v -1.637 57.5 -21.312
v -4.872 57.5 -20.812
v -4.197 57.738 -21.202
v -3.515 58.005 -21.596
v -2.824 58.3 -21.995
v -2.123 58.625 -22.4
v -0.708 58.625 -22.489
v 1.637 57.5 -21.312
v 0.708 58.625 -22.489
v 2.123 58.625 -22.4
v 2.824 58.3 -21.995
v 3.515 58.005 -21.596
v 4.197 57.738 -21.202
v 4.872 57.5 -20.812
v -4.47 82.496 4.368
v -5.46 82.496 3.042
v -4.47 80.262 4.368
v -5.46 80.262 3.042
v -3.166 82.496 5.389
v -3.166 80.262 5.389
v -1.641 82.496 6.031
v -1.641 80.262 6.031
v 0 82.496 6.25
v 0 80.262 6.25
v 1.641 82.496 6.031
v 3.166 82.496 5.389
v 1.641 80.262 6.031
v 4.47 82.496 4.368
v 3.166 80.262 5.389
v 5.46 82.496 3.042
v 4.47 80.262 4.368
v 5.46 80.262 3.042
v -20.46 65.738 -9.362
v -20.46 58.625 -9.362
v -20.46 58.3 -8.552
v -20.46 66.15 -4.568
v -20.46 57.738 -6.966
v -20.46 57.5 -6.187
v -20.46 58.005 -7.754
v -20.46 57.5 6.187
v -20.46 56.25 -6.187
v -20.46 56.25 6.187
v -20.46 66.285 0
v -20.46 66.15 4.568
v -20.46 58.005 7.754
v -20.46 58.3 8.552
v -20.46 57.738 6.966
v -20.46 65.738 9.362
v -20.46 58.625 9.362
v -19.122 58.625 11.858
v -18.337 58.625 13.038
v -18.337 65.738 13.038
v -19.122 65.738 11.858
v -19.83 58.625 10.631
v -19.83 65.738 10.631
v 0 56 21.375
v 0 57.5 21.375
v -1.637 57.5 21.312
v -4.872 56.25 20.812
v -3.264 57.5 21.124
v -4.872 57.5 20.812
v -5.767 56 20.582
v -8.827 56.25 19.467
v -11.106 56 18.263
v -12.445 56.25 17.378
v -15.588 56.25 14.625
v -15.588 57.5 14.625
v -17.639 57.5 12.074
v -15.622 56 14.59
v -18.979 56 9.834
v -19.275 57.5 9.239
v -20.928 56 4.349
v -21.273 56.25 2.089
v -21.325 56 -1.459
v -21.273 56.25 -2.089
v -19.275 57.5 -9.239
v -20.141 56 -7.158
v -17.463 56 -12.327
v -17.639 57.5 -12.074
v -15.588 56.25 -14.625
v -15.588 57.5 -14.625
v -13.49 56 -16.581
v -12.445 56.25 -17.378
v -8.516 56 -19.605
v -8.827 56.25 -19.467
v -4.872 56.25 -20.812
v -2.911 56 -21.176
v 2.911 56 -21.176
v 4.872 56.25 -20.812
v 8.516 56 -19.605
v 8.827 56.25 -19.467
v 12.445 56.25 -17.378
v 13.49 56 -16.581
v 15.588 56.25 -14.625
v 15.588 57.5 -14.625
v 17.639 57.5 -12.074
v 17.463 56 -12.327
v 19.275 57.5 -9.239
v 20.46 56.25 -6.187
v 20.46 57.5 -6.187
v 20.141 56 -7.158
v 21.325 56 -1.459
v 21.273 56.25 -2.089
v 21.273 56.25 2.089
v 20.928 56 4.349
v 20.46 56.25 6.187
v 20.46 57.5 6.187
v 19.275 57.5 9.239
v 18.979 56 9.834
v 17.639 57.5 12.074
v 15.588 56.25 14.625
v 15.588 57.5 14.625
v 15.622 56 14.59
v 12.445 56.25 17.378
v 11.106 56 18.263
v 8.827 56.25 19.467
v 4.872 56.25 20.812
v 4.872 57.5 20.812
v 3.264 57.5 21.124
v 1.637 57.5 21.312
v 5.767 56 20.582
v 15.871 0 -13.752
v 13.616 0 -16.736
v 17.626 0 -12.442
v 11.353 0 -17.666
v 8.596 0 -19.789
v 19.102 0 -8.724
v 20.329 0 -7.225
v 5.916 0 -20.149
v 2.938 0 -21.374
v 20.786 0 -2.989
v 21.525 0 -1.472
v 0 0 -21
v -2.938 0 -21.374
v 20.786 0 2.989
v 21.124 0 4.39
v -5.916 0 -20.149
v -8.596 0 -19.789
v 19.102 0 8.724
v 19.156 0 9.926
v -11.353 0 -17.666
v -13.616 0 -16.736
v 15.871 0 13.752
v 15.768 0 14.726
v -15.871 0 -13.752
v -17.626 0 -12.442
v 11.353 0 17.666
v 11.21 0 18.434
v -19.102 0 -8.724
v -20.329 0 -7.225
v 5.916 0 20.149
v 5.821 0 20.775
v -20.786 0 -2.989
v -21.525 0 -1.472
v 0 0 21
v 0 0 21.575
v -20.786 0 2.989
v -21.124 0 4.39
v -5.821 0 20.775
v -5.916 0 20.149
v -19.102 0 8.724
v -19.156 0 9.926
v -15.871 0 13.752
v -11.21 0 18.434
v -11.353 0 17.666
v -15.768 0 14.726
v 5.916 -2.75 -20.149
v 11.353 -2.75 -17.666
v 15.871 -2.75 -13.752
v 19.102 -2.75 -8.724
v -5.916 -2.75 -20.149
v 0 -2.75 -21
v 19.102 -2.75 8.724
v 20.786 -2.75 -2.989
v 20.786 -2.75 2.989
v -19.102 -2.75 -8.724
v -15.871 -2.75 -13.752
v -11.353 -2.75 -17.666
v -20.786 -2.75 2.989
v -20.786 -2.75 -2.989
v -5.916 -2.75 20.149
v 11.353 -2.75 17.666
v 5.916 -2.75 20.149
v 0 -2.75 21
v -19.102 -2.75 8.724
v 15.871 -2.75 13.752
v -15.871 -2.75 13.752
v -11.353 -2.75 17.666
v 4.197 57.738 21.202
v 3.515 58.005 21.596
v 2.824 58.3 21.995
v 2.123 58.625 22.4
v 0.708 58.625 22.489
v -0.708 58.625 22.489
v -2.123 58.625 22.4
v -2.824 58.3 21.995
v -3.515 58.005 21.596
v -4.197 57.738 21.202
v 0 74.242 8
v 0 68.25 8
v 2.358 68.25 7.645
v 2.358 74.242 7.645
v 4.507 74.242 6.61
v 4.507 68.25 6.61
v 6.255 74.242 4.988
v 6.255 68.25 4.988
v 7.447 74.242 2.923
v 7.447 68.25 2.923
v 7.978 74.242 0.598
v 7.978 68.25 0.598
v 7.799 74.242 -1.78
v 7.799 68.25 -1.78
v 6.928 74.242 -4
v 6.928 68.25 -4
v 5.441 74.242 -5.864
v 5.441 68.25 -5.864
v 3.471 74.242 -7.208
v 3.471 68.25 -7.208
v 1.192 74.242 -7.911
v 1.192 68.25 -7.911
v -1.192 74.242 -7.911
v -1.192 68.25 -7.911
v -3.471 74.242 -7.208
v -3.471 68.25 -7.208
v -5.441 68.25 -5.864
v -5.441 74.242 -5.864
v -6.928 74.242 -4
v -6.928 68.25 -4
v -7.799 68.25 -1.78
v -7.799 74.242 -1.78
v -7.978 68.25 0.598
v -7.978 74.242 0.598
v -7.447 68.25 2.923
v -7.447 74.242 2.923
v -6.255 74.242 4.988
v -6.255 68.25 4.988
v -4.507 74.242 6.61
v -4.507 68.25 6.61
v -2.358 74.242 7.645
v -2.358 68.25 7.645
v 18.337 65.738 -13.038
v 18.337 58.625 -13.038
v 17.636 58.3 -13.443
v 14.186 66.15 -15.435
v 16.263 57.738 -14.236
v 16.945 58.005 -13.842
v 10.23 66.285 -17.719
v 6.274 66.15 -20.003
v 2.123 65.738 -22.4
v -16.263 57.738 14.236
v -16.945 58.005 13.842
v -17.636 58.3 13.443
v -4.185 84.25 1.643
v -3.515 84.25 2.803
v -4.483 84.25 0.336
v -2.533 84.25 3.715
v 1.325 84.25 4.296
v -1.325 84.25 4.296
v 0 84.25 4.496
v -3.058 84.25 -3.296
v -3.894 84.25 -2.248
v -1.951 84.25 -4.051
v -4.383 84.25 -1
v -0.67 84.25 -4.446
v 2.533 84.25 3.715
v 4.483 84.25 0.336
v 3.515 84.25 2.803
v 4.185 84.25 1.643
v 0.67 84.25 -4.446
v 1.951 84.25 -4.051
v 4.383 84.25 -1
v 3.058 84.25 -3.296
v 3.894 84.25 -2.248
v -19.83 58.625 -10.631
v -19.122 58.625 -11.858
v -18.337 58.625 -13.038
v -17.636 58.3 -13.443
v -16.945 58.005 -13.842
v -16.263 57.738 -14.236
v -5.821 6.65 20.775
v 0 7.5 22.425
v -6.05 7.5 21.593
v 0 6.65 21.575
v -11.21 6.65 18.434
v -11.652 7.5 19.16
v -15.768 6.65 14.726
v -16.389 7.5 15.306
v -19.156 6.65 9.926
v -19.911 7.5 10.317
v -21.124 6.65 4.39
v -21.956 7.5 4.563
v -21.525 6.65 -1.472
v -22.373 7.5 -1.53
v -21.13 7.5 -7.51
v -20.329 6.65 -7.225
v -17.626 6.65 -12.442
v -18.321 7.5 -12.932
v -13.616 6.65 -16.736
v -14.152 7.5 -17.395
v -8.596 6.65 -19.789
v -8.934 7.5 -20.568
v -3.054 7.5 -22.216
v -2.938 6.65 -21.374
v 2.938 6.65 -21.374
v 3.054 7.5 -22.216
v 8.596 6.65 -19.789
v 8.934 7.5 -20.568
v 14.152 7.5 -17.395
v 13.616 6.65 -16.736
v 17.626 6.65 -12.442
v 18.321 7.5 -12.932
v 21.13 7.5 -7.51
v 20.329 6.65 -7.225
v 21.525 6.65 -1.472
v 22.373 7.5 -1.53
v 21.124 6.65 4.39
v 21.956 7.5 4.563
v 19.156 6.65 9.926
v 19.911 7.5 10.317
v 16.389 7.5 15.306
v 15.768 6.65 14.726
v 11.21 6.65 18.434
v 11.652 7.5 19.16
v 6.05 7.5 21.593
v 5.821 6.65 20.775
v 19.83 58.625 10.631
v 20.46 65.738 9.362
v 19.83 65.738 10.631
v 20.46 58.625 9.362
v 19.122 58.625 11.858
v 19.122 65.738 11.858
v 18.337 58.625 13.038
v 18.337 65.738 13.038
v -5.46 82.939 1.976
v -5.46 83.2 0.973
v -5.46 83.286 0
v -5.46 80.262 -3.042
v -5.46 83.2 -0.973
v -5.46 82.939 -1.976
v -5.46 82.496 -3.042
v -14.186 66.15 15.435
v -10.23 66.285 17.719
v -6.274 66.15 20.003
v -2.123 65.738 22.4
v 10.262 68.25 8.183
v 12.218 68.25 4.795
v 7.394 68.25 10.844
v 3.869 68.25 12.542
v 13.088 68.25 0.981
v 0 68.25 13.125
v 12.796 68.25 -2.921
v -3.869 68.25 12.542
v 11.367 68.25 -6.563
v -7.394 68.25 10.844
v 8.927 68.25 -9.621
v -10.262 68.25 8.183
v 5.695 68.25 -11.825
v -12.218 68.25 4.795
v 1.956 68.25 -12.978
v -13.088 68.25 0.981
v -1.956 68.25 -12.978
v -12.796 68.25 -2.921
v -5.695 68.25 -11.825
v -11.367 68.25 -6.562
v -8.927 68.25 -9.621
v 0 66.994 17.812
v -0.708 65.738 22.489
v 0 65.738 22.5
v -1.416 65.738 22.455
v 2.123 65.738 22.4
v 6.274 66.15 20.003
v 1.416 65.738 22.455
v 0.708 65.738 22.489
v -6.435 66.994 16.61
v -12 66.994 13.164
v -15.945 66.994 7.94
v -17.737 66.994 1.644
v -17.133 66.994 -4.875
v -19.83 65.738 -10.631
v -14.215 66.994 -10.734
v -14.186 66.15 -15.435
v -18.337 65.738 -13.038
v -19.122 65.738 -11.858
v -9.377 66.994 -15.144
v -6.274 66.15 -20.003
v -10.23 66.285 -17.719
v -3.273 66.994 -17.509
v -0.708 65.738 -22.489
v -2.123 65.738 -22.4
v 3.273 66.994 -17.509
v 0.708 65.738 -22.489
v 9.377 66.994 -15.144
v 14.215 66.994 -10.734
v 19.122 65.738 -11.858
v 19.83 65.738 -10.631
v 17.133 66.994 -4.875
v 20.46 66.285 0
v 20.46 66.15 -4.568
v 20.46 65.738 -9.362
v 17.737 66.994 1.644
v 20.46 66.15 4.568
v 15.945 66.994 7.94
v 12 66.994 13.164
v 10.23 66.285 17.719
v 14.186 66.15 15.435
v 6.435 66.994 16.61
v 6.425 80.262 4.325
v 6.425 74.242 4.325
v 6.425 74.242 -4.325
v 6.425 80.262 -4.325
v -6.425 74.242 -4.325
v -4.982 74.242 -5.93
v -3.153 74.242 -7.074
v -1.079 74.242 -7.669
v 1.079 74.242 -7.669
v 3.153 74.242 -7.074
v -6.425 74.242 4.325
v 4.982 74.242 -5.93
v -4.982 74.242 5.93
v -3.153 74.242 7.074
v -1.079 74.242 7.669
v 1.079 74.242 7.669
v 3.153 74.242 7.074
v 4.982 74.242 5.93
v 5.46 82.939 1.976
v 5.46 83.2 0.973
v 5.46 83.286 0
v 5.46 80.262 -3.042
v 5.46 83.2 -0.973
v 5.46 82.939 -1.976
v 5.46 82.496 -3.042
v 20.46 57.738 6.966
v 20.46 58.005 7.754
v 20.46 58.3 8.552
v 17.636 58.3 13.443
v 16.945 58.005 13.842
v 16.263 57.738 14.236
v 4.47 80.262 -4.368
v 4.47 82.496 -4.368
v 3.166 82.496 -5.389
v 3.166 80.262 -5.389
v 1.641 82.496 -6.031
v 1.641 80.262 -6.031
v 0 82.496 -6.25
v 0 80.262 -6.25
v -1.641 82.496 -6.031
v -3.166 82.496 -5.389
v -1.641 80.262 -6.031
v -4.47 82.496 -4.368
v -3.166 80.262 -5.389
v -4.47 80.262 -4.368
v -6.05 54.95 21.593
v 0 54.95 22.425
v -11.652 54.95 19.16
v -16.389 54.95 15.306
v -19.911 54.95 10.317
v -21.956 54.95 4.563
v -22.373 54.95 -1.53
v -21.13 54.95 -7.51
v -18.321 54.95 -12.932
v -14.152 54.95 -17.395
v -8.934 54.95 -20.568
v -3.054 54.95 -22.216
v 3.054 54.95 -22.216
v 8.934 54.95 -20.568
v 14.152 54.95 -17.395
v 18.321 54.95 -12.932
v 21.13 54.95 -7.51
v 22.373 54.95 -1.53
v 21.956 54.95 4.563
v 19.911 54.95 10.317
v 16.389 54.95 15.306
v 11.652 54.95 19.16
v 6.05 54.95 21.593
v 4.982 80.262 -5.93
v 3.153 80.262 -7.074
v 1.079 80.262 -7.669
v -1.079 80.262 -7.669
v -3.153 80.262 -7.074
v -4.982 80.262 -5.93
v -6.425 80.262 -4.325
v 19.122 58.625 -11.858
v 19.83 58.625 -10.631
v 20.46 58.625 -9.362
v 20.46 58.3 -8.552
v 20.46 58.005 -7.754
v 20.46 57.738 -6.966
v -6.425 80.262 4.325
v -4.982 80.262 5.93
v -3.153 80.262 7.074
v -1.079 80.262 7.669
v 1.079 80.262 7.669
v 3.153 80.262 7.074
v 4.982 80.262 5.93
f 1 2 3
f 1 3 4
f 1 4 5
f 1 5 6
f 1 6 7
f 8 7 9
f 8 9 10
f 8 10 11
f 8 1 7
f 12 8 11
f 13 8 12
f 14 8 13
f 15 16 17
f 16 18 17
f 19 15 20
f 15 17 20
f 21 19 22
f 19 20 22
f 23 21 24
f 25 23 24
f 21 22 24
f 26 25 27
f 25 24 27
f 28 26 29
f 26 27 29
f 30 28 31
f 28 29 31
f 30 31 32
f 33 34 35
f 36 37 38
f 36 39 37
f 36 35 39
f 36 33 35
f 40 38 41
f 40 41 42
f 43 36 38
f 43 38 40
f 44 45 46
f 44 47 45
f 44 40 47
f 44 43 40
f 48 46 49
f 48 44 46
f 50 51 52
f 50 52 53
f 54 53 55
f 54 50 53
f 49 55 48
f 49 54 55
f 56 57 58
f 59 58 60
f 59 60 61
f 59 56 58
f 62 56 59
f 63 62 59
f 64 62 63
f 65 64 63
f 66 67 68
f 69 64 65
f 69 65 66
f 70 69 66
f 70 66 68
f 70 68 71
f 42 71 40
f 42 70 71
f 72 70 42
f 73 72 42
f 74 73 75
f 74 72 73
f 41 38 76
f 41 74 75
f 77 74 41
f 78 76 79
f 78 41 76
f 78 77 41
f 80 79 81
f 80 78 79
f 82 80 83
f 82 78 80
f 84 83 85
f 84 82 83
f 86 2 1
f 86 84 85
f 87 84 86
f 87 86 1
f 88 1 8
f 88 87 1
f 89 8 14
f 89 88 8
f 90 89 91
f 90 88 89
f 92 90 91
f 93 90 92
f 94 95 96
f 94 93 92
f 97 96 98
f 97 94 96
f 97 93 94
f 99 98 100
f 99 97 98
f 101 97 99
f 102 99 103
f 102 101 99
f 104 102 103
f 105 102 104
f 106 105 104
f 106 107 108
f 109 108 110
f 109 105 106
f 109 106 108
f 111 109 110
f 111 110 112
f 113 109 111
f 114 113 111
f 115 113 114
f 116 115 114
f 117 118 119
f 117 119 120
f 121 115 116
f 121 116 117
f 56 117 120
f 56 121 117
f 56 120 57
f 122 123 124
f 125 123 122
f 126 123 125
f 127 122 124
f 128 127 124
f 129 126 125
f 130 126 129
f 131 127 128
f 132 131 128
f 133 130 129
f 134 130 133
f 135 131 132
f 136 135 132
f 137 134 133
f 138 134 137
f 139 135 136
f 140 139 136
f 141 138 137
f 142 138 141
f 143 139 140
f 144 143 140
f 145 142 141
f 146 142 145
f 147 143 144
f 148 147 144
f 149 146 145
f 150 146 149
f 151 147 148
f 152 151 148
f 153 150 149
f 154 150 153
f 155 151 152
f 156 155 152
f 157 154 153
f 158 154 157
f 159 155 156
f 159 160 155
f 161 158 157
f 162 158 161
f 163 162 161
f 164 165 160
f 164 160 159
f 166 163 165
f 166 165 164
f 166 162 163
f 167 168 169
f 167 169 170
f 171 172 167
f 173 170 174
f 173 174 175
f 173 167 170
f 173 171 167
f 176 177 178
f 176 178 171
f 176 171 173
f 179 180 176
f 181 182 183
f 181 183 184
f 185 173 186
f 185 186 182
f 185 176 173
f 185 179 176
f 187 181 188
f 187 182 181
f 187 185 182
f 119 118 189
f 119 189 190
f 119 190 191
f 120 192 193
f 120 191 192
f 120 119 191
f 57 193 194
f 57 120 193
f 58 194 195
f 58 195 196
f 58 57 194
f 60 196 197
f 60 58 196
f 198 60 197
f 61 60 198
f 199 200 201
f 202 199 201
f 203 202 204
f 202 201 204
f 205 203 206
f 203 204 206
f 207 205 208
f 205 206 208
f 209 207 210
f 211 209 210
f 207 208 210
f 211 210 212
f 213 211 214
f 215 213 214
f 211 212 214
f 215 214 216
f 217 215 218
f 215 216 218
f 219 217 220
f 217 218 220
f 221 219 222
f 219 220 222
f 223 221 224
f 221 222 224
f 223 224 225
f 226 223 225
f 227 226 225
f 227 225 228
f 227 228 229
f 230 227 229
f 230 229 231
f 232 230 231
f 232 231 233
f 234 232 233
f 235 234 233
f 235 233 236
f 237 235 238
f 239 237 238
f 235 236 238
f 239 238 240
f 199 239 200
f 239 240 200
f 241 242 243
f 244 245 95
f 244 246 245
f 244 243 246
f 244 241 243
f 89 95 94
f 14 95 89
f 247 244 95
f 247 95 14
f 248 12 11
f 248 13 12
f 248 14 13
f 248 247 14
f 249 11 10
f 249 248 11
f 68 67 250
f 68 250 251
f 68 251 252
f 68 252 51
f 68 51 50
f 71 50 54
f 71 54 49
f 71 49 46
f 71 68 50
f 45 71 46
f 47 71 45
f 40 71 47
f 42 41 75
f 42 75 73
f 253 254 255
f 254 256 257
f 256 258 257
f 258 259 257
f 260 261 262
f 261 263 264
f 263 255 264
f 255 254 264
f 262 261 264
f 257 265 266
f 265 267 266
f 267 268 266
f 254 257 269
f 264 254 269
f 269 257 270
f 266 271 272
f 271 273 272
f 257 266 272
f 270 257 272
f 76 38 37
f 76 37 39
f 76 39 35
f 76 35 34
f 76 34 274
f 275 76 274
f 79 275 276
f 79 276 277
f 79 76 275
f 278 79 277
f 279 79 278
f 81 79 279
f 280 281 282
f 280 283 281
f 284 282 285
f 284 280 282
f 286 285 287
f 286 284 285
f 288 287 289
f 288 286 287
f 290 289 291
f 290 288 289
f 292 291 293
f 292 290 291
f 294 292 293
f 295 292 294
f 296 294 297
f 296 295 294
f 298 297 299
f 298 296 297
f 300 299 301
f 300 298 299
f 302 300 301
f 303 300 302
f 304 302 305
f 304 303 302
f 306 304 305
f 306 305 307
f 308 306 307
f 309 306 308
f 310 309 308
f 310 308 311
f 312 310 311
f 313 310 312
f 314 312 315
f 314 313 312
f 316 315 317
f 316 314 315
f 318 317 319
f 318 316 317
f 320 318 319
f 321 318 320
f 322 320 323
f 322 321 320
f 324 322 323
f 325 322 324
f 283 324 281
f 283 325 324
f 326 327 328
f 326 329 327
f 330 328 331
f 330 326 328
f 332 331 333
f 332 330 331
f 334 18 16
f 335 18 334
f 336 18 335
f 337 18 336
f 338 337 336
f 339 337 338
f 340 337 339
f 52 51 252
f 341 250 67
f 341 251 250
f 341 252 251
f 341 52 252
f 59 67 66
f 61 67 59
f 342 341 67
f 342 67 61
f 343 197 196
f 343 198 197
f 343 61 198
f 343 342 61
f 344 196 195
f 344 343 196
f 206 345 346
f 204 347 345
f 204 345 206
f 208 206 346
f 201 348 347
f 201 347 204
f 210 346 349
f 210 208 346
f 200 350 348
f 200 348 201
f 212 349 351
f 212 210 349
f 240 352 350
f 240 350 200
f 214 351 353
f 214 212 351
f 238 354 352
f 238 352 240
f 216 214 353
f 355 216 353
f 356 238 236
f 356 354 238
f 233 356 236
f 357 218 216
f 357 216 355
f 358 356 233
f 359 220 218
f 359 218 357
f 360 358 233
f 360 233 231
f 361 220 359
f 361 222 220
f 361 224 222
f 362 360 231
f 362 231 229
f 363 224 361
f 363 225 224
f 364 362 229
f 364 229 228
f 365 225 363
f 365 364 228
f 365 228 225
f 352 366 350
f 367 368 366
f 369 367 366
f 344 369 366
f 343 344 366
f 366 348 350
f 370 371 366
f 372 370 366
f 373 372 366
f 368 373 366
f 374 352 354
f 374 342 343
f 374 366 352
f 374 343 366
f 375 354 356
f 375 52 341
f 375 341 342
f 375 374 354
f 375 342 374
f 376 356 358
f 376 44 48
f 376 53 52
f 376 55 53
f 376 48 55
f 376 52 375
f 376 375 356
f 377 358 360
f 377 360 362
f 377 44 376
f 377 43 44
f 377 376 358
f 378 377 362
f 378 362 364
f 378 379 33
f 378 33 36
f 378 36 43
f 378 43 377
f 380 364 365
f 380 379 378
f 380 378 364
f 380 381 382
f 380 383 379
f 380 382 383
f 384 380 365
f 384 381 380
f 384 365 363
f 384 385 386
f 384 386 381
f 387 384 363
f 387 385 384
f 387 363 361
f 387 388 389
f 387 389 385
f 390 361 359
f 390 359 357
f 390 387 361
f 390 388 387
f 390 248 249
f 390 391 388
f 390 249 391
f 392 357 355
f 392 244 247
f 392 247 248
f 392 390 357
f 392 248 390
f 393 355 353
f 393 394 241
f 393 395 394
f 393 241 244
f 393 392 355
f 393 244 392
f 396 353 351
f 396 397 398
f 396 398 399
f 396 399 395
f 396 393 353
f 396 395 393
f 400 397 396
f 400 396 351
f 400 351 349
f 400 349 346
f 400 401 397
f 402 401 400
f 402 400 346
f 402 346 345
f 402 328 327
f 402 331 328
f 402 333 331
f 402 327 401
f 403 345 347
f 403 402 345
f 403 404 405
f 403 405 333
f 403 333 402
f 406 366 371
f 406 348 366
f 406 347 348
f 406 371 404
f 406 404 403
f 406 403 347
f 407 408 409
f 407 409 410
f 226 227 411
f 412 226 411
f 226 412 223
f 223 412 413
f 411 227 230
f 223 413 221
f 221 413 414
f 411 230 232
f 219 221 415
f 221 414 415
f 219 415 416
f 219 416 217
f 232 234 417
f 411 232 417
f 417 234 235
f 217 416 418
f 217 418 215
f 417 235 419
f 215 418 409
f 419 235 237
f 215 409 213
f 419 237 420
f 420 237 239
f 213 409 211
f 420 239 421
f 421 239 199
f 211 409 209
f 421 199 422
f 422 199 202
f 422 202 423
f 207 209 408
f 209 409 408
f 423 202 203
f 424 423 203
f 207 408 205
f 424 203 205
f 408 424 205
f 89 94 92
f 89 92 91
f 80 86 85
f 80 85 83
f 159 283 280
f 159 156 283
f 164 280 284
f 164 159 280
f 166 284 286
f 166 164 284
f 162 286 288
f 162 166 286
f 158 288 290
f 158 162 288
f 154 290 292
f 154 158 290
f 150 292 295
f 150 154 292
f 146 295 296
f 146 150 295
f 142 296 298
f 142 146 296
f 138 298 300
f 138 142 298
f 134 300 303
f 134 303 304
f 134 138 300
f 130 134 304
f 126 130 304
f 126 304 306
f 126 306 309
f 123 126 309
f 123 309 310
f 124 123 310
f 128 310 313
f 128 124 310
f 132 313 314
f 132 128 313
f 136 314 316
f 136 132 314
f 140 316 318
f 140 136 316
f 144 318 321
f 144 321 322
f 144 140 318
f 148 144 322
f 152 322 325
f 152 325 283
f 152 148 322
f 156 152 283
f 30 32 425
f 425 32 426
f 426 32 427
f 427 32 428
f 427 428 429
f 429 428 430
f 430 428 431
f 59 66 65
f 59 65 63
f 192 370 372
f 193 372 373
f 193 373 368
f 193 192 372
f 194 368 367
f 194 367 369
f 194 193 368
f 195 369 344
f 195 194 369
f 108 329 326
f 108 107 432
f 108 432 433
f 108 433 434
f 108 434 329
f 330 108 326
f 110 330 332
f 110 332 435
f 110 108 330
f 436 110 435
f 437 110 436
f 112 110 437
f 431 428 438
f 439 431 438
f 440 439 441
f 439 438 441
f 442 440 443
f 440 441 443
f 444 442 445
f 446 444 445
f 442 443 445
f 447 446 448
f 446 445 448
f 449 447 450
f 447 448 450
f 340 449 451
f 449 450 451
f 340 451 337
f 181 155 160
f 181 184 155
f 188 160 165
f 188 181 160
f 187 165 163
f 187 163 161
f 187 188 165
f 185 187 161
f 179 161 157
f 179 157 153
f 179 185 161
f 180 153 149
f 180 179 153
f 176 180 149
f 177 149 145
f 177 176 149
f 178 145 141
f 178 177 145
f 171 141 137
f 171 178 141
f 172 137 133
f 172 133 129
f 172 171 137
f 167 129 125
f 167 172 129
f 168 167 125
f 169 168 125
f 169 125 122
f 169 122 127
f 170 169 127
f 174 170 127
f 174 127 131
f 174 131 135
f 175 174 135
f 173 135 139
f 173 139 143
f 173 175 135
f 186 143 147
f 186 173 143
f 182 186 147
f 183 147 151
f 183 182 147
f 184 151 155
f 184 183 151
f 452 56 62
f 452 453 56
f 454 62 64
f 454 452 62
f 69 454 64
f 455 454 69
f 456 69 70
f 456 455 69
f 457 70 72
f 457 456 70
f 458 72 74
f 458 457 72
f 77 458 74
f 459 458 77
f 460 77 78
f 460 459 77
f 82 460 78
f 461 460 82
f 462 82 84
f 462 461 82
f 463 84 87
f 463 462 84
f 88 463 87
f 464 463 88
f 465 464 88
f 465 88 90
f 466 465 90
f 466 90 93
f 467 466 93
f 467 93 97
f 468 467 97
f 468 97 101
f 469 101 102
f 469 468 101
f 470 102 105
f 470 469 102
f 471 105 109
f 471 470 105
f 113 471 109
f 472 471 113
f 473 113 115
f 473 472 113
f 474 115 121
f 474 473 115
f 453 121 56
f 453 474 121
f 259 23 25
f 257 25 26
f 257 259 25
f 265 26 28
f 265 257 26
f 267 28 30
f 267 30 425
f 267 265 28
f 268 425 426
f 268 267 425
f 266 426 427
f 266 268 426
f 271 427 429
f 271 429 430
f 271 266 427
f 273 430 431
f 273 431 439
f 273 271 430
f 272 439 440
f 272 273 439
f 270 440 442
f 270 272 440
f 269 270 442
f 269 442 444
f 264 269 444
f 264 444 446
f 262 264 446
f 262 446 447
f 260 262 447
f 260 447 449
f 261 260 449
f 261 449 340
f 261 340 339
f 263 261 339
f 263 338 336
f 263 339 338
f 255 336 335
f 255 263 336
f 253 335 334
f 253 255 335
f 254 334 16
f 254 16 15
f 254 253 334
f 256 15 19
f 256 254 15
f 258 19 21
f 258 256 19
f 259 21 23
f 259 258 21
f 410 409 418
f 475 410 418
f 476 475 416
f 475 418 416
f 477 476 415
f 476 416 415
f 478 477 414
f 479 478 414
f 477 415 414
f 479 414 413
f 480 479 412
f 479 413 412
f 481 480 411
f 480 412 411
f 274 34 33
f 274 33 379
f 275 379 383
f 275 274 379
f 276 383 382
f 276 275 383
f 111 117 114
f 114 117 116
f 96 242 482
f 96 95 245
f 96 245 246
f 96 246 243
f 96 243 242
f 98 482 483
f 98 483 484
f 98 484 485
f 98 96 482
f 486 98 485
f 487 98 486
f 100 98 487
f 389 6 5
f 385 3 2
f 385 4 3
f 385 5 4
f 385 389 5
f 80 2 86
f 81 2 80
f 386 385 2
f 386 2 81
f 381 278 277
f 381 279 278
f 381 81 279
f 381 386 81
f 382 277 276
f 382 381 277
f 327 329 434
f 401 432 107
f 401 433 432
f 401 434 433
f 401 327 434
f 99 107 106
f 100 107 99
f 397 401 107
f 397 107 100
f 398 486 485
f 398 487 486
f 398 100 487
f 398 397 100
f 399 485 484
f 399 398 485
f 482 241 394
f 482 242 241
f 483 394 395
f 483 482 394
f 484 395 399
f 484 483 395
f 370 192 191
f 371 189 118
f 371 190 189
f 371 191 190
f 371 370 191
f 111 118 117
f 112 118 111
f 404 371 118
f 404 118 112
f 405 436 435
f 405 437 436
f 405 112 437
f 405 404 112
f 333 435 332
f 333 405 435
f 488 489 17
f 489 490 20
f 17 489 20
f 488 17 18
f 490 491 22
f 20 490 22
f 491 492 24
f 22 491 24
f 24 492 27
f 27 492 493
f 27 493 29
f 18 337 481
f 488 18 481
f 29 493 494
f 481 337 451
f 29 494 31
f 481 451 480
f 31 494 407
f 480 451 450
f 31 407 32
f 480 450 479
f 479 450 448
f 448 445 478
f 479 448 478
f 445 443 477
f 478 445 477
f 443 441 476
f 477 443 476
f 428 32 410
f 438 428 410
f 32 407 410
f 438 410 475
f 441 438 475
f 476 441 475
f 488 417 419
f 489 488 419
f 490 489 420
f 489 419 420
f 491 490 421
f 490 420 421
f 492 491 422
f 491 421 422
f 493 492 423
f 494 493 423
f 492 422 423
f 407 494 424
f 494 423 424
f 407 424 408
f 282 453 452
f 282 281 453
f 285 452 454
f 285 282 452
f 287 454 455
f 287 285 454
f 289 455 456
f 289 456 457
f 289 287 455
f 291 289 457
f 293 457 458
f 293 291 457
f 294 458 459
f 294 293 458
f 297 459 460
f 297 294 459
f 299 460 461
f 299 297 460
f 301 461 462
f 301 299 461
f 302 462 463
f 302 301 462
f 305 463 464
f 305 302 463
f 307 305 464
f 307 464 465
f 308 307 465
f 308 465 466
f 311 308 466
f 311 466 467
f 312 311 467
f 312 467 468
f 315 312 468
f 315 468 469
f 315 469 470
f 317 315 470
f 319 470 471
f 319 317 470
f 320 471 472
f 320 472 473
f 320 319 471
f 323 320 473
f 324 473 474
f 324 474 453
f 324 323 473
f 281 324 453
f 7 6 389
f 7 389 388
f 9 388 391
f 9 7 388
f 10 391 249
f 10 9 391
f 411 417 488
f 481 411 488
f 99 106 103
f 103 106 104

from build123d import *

# Parameters (mm, degrees)
SKETCH2_OUTSIDE_W       = 66.07
SKETCH2_OUTSIDE_H       = 66.07
CUT_EXTRUDE1_DEPTH      = 12
CHAMFER1_SIZE           = 1.754
SKETCH5_W               = 2.285
SKETCH5_H               = 3.988
CUT_EXTRUDE2_DEPTH      = 23.5
CUT_EXTRUDE2_DEPTH_BACK = 23.5
SKETCH6_W               = 1.575
SKETCH6_H               = 6.02
CUT_EXTRUDE3_DEPTH      = 23.5
CUT_EXTRUDE3_DEPTH_BACK = 23.5


with BuildPart() as part:
    # Sketch1 → Revolve1 (revolve)
    with BuildSketch(Plane.XY, mode=Mode.PRIVATE) as revolve1_sk:
        Polygon((-21.575, 0), (-21, 0), (-21, -2.75), (0, -2.75), (0, 68.25), (-13.125, 68.25), (-22.5, 65.737976321), (-22.5, 58.625), (-21.375, 57.5), (-21.375, 56), (-22.425, 54.95), (-22.425, 7.5), (-21.575, 6.65), align=None)
    revolve(revolve1_sk.sketch.rotate(Axis((0, 0, 0), (0, -1, 0)), 270), axis=Axis((0, 0, 0), (0, -1, 0)))  # turned: the seam where the file's is

    # Sketch2 outside → Cut-Extrude1 (cut)
    with BuildSketch(Plane(origin=(0, 68.25, 0), x_dir=(1, 0, 0), z_dir=(0, 1, 0))):
        Rectangle(SKETCH2_OUTSIDE_W, SKETCH2_OUTSIDE_H)
        Polygon((0, 23.625173015), (-20.46, 11.812586508), (-20.46, -11.812586508), (0, -23.625173015), (20.46, -11.812586508), (20.46, 11.812586508), align=None, mode=Mode.SUBTRACT)
    extrude(amount=-CUT_EXTRUDE1_DEPTH, mode=Mode.SUBTRACT)

    # Sketch4 → Revolve2 (revolve)
    with BuildSketch(Plane.XY, mode=Mode.PRIVATE) as revolve2_sk:
        Polygon((0, 84.25), (-6.25, 84.25), (-6.25, 80.262), (-7.745, 80.262), (-7.745, 74.242), (-8, 74.242), (-8, 68.25), (0, 68.25), align=None)
    revolve(revolve2_sk.sketch.rotate(Axis((0, 0, 0), (0, 1, 0)), 90), axis=Axis((0, 0, 0), (0, 1, 0)))  # turned: the seam where the file's is

    # Chamfer1
    chamfer1_edges = [part.edges().sort_by_distance(p)[0] for p in [
        (0, 84.25, -6.25),
    ]]
    chamfer(chamfer1_edges, length=CHAMFER1_SIZE)

    # Sketch5 → Cut-Extrude2 (cut, two sides)
    with BuildSketch(Plane.XY) as cut_extrude2_sk:
        with Locations((-6.6025, 82.256)):
            Rectangle(SKETCH5_W, SKETCH5_H)
        with Locations((6.6025, 82.256)):
            Rectangle(SKETCH5_W, SKETCH5_H)
    extrude(amount=CUT_EXTRUDE2_DEPTH, mode=Mode.SUBTRACT)
    extrude(cut_extrude2_sk.sketch, amount=-CUT_EXTRUDE2_DEPTH_BACK, mode=Mode.SUBTRACT)

    # Sketch6 → Cut-Extrude3 (cut, two sides)
    with BuildSketch(Plane.XY) as cut_extrude3_sk:
        with Locations((-7.2125, 77.252)):
            Rectangle(SKETCH6_W, SKETCH6_H)
        with Locations((7.2125, 77.252)):
            Rectangle(SKETCH6_W, SKETCH6_H)
    extrude(amount=CUT_EXTRUDE3_DEPTH, mode=Mode.SUBTRACT)
    extrude(cut_extrude3_sk.sketch, amount=-CUT_EXTRUDE3_DEPTH_BACK, mode=Mode.SUBTRACT)


solid = part.part
